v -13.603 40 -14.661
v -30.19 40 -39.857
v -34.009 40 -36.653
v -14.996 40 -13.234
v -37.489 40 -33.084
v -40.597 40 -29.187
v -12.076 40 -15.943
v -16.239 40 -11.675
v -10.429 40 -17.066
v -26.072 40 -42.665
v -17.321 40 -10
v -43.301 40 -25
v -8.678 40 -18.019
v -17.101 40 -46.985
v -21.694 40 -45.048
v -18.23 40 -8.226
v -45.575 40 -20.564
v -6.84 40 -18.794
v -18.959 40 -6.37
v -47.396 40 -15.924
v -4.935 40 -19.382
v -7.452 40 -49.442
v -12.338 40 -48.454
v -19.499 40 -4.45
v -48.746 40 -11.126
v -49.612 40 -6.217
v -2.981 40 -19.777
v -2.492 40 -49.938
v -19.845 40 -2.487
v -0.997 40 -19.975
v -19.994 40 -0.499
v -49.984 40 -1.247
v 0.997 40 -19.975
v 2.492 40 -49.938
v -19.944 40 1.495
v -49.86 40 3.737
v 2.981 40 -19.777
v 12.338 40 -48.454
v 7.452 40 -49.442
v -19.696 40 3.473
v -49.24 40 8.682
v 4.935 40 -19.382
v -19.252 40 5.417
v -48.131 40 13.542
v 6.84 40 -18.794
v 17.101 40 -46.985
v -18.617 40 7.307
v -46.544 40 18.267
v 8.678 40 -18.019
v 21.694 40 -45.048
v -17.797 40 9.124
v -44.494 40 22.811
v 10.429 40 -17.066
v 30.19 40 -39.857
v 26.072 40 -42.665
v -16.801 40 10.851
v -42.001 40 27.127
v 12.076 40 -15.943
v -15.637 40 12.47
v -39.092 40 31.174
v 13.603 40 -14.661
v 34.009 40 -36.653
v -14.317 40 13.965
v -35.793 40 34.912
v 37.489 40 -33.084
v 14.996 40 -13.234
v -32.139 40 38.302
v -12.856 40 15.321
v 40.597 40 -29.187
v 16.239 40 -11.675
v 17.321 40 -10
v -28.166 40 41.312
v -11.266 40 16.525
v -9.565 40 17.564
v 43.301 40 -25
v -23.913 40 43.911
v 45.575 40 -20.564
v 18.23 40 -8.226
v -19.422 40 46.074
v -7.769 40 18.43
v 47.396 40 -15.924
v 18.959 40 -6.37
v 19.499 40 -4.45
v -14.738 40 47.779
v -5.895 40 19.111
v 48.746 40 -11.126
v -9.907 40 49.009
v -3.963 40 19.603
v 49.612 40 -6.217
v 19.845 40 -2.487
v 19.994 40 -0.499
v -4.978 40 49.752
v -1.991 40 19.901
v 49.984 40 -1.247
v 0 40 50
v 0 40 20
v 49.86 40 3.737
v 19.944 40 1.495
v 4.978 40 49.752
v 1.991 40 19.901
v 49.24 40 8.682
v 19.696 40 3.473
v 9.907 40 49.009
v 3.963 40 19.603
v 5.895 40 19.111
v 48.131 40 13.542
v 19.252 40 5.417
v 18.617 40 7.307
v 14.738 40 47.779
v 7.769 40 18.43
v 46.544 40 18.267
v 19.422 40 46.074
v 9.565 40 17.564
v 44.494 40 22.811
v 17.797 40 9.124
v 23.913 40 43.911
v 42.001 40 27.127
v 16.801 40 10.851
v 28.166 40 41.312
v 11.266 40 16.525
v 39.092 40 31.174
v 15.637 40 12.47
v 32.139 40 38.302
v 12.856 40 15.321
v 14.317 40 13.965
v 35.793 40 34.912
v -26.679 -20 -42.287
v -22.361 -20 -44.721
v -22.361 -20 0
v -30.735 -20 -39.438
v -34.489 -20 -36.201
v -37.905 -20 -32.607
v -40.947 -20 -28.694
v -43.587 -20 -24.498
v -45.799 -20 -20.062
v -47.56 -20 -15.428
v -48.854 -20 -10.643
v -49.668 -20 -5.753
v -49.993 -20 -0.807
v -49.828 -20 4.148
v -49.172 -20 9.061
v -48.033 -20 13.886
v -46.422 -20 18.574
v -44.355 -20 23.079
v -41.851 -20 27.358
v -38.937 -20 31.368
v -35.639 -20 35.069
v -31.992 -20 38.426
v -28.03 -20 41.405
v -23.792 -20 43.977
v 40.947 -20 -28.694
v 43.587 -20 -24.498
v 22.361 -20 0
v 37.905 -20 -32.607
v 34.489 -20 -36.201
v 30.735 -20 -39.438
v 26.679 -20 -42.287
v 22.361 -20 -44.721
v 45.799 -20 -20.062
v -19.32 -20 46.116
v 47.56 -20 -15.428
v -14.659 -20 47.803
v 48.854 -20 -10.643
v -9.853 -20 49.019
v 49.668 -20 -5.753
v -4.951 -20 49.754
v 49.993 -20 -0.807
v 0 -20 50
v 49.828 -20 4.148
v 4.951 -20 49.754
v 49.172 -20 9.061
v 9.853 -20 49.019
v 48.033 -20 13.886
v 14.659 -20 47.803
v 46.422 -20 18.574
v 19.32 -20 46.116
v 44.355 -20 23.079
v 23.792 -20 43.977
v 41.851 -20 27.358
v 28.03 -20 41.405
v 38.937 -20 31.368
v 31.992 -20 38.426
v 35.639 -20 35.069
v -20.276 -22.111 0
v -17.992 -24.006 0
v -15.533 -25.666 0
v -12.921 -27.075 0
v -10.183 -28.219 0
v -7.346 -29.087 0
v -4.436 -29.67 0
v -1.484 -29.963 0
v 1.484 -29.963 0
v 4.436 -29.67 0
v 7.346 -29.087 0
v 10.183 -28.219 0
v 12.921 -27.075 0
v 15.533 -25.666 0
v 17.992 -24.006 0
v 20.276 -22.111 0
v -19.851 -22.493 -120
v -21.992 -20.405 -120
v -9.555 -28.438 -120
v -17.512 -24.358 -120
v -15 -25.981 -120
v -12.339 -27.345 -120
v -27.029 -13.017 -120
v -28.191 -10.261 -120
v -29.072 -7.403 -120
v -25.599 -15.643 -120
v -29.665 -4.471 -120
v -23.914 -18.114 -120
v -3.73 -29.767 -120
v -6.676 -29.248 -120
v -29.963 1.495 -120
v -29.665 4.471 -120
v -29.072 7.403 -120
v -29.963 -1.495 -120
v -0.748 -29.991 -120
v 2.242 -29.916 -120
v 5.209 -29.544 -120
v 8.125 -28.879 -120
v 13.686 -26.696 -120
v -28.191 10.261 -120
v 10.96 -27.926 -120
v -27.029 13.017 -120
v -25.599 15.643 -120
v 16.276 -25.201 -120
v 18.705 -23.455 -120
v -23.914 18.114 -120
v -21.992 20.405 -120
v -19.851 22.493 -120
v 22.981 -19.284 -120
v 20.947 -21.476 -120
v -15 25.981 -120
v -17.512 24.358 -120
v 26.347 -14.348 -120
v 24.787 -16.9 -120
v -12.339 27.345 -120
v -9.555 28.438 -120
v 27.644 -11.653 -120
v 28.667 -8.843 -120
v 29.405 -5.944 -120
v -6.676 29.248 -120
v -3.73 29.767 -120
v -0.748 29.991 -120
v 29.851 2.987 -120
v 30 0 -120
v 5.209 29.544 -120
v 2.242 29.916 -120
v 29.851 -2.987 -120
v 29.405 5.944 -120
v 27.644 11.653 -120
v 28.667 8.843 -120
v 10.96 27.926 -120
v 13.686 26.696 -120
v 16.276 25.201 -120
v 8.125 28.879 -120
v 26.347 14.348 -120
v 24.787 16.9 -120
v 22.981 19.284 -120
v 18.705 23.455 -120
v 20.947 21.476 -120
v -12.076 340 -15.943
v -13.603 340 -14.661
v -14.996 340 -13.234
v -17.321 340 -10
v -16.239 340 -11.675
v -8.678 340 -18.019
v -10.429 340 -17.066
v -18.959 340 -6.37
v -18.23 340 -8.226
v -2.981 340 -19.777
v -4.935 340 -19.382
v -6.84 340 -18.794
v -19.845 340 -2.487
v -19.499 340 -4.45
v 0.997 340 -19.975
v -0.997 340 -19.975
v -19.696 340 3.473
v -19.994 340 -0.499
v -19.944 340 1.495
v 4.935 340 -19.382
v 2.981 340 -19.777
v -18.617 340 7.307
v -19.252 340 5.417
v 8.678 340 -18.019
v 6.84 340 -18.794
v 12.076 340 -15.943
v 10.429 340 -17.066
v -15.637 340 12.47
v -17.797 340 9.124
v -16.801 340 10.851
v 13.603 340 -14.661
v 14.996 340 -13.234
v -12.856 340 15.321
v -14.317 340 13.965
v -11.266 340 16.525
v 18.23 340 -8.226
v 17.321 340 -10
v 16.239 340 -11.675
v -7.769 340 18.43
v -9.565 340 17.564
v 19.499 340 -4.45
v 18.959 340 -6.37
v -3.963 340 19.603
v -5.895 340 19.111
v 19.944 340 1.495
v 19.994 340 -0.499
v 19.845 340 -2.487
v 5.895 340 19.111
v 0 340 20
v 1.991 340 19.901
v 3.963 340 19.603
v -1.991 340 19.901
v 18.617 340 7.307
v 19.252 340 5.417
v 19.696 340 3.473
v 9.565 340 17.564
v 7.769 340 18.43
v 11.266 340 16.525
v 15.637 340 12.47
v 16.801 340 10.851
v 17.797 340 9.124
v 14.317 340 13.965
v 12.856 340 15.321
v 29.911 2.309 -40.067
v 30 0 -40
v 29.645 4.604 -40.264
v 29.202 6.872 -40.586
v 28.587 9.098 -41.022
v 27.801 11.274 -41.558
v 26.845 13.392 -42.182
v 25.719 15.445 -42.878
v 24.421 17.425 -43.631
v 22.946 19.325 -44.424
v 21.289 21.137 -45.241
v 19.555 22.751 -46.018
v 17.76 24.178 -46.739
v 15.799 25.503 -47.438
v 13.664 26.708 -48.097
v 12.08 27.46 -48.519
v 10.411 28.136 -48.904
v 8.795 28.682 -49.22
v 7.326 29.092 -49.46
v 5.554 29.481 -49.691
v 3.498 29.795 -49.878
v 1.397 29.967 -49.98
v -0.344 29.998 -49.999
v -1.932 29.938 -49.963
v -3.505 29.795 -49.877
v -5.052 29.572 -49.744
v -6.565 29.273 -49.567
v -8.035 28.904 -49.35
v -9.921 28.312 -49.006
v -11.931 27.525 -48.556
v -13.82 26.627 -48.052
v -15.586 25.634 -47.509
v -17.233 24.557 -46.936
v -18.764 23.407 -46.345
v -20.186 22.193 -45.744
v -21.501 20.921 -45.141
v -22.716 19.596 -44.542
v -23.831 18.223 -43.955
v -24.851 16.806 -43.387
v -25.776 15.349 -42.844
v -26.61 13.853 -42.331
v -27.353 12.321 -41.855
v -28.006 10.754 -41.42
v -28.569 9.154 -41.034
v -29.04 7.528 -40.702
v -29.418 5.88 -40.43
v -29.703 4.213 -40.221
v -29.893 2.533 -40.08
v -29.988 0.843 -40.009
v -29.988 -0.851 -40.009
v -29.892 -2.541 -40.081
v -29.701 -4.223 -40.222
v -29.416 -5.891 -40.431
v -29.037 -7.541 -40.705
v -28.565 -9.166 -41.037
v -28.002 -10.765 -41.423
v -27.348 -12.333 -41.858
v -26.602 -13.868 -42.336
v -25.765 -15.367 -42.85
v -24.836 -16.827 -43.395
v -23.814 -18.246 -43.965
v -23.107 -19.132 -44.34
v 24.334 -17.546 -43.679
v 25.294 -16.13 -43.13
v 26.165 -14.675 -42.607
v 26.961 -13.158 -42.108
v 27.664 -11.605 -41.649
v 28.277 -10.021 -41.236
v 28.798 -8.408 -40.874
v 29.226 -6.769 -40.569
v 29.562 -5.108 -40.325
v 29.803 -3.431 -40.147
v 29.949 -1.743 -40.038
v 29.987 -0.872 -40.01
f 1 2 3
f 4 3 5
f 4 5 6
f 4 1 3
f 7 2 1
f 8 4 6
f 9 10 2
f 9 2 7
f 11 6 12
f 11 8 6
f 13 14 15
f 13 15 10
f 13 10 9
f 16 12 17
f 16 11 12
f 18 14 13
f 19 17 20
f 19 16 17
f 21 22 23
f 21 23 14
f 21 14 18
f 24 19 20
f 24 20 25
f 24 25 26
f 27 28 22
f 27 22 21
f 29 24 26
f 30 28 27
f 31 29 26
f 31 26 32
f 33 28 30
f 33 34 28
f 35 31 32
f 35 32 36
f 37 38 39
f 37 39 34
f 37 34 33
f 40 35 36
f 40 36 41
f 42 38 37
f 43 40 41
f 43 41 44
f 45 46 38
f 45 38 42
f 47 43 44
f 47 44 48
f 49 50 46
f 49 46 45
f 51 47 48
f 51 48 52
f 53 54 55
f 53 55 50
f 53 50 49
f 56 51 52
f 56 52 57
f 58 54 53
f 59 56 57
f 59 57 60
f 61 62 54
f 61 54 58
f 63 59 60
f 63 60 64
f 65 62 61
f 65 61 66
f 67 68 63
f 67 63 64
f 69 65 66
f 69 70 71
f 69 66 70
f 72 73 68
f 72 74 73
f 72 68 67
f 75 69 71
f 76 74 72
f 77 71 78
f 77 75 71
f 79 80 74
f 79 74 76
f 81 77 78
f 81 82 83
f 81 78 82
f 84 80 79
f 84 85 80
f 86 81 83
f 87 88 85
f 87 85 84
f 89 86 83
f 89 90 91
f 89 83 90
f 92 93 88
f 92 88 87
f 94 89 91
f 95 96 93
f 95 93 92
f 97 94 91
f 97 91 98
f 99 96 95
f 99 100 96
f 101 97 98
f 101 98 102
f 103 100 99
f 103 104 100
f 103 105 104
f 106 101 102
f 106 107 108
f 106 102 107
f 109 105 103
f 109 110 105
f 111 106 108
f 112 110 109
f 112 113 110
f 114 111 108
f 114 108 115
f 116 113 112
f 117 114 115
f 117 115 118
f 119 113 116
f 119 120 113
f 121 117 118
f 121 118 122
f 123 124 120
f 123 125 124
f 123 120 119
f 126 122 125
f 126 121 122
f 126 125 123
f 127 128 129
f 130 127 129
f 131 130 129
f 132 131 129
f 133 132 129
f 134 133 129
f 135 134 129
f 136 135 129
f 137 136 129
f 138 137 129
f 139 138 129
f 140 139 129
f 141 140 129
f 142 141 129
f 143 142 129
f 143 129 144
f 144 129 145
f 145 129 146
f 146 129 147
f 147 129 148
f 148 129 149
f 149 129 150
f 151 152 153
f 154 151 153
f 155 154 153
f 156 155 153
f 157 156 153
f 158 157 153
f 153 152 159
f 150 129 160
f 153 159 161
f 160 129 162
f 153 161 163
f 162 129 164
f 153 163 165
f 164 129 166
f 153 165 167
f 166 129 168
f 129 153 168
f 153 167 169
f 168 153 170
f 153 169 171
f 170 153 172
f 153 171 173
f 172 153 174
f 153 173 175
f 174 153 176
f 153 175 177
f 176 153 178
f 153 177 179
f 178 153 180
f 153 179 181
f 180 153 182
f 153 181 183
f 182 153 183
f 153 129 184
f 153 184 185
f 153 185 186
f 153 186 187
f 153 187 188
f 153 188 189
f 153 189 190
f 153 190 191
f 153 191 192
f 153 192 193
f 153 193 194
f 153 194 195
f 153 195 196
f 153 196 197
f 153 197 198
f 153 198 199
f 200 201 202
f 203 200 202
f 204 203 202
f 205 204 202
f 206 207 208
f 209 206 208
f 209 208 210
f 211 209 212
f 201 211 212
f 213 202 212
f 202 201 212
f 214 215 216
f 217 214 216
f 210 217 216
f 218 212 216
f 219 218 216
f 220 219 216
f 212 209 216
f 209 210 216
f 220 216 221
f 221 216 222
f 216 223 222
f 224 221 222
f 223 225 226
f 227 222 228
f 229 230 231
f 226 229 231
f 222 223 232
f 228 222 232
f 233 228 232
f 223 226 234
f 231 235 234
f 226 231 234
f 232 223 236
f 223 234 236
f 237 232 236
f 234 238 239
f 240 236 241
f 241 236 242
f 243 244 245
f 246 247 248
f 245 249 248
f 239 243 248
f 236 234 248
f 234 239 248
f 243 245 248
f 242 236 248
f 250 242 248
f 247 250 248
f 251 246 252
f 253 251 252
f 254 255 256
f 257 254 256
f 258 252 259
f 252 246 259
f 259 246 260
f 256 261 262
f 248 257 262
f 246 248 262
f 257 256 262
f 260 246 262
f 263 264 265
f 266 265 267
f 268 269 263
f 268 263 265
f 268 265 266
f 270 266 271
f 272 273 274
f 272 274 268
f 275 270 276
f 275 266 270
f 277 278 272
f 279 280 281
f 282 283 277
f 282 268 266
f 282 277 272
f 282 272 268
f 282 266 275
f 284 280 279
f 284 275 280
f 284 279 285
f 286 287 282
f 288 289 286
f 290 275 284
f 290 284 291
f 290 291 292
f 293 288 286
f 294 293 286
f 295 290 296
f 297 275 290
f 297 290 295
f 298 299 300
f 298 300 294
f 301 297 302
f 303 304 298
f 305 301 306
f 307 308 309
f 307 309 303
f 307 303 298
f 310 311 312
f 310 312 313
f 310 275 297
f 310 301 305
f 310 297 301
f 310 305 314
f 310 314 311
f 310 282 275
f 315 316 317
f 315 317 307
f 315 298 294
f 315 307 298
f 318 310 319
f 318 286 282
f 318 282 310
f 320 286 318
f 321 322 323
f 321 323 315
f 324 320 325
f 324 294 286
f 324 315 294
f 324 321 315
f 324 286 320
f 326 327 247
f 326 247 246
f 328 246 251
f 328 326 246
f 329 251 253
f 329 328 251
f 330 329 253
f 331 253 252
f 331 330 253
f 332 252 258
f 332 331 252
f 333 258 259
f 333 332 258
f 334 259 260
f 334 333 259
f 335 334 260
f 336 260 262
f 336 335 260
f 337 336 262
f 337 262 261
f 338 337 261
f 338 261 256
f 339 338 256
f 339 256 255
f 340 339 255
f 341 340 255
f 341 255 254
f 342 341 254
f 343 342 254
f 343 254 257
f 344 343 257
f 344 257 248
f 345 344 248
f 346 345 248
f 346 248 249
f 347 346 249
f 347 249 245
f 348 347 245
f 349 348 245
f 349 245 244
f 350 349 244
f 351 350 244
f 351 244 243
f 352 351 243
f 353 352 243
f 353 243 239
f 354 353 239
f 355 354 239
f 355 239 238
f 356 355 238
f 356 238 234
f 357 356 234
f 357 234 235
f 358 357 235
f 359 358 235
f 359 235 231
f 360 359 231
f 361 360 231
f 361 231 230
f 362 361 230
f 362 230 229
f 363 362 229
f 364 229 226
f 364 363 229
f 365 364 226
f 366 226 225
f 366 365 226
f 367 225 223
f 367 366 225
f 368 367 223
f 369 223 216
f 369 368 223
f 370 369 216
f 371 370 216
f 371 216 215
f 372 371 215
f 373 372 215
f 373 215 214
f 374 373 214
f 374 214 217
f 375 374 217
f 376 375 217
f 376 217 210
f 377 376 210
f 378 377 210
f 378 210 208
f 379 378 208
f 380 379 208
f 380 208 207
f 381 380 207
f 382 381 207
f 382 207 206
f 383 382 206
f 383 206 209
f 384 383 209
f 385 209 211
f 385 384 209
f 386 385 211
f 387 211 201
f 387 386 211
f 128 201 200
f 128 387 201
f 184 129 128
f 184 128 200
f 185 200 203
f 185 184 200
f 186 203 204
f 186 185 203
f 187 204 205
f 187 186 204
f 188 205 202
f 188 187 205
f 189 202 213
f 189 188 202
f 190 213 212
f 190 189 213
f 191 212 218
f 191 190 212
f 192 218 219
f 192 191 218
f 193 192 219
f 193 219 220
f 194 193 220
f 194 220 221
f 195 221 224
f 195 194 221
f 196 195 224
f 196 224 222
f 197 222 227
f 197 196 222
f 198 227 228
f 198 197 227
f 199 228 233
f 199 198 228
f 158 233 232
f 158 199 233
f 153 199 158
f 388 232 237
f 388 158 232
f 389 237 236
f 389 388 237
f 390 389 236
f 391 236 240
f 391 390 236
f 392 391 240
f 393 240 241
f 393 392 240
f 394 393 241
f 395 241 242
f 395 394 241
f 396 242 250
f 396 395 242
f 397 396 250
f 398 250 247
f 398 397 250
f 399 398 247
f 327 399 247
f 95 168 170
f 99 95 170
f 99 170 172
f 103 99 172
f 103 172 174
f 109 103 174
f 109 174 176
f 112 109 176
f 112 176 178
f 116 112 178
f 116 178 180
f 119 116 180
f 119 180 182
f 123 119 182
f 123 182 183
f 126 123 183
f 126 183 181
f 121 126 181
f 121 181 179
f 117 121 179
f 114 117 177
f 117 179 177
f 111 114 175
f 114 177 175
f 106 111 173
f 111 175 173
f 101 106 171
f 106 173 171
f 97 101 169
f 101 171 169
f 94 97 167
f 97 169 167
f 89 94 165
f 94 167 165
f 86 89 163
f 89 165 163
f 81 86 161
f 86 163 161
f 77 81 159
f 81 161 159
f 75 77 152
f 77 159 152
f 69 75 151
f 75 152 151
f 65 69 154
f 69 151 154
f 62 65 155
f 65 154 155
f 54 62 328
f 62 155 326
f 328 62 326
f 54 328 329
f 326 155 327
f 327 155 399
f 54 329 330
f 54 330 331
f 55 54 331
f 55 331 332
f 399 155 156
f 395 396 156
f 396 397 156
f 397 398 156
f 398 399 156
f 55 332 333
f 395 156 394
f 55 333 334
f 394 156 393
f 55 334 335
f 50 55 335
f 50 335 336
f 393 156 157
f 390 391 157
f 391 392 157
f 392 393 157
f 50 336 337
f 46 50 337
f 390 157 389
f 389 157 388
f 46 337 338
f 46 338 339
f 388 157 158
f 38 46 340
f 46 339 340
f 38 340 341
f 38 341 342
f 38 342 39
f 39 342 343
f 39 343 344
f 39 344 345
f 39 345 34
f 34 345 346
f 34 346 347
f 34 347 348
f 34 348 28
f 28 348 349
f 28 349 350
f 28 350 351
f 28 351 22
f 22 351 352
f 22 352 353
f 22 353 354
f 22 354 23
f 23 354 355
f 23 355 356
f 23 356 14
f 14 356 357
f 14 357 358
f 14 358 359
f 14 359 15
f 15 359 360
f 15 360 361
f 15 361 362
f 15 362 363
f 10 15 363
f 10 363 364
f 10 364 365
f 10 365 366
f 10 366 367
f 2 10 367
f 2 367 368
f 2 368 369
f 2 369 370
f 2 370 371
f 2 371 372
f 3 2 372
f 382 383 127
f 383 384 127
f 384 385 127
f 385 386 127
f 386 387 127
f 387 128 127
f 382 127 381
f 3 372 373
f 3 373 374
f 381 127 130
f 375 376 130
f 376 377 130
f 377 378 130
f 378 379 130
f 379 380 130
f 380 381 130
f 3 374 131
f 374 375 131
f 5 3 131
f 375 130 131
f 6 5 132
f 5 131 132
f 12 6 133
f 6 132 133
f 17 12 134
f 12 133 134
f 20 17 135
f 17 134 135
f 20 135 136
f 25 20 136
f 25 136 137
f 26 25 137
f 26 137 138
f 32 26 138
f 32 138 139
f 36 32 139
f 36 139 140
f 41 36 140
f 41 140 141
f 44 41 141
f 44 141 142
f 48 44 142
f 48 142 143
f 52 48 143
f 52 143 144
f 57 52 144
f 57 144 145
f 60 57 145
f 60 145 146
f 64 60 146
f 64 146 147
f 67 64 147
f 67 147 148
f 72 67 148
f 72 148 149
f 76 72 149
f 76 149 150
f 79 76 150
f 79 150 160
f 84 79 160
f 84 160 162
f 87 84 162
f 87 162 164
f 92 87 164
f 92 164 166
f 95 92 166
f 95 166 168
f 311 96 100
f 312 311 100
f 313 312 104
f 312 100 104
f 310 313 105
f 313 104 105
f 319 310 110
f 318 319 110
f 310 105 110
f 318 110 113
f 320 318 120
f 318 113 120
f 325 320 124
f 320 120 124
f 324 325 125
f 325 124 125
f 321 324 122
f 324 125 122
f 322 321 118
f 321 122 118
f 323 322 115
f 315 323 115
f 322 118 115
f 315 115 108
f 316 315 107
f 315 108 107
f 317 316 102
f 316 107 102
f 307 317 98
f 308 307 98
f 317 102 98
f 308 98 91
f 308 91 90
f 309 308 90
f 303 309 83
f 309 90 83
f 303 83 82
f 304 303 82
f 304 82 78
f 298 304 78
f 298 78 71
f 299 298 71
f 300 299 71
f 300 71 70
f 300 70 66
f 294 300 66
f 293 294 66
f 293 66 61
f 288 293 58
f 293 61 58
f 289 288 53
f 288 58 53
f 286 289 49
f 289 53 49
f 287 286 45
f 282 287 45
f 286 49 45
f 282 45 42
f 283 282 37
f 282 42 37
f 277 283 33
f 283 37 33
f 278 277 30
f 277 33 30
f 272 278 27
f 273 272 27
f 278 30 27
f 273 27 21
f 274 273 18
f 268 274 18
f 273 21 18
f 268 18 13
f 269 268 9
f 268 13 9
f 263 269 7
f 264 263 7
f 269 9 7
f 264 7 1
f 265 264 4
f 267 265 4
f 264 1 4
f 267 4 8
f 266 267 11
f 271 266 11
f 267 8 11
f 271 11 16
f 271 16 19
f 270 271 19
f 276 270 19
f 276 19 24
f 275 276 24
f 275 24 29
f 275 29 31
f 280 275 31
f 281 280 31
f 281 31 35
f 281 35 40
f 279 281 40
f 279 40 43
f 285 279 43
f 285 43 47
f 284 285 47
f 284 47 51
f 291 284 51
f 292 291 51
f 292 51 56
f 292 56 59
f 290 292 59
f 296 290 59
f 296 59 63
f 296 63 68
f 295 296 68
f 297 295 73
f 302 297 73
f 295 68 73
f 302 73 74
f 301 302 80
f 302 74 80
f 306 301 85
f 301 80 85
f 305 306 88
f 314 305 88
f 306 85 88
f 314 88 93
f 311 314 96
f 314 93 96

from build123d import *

# Parameters (mm, degrees)
SKETCH1_R                = 30
BOSS_EXTRUDE1_DEPTH      = 120
BOSS_EXTRUDE2_DEPTH      = 40
BOSS_EXTRUDE2_DEPTH_BACK = 20
SKETCH2_R                = 50
SKETCH3_R                = 20
BOSS_EXTRUDE3_DEPTH      = 300


with BuildPart() as part:
    # Sketch1 → Boss-Extrude1 (new body)
    with BuildSketch(Plane.XY):
        Circle(SKETCH1_R)
    extrude(amount=-BOSS_EXTRUDE1_DEPTH)

    # Sketch2 → Boss-Extrude2 (add, two sides: drawn at the far end of the back side and taken through both)
    with BuildSketch(Plane(origin=(0, 0, 0), x_dir=(1, 0, 0), z_dir=(0, 1, 0)).offset(-BOSS_EXTRUDE2_DEPTH_BACK)):
        Circle(SKETCH2_R)
    extrude(amount=BOSS_EXTRUDE2_DEPTH + BOSS_EXTRUDE2_DEPTH_BACK)

    # Sketch3 → Boss-Extrude3 (add)
    with BuildSketch(Plane(origin=(0, 40, 0), x_dir=(1, 0, 0), z_dir=(0, 1, 0))):
        Circle(SKETCH3_R)
    extrude(amount=BOSS_EXTRUDE3_DEPTH)


solid = part.part
